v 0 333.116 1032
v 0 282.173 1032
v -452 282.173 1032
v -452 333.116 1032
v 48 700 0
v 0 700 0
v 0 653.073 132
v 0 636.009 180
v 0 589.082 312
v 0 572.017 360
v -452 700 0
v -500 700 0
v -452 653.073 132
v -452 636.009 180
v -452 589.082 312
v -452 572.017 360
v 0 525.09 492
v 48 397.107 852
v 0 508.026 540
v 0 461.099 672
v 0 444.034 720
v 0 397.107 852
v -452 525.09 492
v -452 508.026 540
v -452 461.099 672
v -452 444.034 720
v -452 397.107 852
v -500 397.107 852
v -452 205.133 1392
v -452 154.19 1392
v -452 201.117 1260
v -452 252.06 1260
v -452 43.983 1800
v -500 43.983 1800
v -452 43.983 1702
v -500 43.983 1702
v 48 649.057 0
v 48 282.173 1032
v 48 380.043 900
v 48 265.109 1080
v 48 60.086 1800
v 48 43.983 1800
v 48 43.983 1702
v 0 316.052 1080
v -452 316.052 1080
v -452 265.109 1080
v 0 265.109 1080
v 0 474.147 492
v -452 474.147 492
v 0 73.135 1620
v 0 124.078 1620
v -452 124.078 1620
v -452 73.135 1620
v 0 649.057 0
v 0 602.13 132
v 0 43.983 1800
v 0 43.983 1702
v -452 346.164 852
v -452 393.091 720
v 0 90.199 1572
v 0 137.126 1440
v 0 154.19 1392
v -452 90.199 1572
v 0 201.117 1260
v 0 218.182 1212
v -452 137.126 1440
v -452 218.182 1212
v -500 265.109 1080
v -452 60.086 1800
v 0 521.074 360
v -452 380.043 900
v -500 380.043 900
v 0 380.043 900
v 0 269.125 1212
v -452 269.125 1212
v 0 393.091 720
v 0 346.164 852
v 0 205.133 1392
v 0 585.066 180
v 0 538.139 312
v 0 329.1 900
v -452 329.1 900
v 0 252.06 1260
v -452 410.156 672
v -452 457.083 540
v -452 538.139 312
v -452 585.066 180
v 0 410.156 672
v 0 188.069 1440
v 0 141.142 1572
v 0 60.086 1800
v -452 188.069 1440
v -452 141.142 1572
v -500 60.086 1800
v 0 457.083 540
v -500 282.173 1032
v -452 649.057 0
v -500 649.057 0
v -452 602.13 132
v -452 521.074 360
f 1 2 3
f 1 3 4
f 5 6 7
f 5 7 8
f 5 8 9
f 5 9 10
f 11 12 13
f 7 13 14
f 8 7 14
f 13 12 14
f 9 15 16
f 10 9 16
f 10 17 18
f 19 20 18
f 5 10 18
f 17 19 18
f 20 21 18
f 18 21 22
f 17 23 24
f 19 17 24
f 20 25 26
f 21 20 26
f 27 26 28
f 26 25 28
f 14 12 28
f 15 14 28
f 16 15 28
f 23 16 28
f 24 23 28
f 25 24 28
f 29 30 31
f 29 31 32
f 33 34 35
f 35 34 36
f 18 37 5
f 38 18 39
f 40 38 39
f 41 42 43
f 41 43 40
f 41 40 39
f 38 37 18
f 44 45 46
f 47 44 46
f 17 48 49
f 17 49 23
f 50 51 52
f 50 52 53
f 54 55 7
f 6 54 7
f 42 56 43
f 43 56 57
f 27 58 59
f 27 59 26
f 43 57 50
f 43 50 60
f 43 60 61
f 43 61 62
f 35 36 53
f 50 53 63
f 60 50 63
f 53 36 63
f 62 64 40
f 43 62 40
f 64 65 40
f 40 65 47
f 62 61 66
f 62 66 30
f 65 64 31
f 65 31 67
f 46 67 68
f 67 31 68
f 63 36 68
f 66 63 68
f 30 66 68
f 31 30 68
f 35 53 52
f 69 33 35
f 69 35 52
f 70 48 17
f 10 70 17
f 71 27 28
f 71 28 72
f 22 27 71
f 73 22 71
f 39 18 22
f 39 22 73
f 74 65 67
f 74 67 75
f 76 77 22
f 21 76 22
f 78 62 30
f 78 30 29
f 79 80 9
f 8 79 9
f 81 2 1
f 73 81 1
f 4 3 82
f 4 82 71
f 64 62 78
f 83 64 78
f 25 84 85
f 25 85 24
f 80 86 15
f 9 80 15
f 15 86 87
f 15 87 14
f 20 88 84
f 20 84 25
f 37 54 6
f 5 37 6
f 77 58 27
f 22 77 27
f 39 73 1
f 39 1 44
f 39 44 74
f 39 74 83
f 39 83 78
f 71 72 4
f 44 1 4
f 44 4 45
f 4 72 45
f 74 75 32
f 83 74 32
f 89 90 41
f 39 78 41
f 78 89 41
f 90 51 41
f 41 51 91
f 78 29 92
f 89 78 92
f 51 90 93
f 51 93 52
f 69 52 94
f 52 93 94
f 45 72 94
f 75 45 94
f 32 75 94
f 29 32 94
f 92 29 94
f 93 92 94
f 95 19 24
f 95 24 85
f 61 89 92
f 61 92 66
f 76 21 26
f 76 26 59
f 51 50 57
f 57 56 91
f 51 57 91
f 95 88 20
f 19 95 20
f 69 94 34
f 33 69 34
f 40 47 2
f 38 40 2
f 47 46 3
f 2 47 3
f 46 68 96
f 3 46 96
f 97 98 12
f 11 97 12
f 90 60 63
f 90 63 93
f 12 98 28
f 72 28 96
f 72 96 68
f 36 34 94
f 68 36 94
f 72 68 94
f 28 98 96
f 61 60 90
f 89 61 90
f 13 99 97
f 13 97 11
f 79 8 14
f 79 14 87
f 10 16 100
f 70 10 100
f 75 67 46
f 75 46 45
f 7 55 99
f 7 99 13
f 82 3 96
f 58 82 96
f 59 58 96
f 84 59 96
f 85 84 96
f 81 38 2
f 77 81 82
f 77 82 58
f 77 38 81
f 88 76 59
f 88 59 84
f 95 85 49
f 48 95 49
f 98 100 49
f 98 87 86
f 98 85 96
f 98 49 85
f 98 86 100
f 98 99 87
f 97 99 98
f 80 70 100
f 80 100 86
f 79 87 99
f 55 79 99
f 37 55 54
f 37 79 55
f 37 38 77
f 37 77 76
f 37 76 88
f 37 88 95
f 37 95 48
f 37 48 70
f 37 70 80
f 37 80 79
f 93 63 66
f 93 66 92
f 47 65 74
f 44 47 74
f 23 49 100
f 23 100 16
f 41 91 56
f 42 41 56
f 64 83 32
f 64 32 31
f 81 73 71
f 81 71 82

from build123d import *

# Parameters (mm, degrees)
F1_DEPTH = 48
F3_DEPTH = 452


with BuildPart() as f1:
    # F0 (on Right) → F1 (new body)
    with BuildSketch(Plane.YZ):
        Polygon((538.1385763868, 312), (585.0655876551, 180), (636.0086209978, 180), (589.0816097296, 312), align=None)
        Polygon((457.0828296508, 540), (474.1471973847, 492), (525.0902307274, 492), (508.0258629935, 540), align=None)
        Polygon((265.1086926442, 1080), (282.1730603782, 1032), (333.1160937209, 1032), (316.051725987, 1080), align=None)
        Polygon((90.1989233716, 1572), (137.1259346399, 1440), (188.0689679826, 1440), (141.1419567144, 1572), align=None)
        Polygon((346.1644393803, 852), (393.0914506486, 720), (444.0344839913, 720), (397.1074727231, 852), align=None)
        Polygon((73.1345556377, 1620), (90.1989233716, 1572), (141.1419567144, 1572), (124.0775889805, 1620), align=None)
        Polygon((474.1471973847, 492), (521.0742086529, 360), (572.0172419957, 360), (525.0902307274, 492), align=None)
        Polygon((410.1558183825, 672), (457.0828296508, 540), (508.0258629935, 540), (461.0988517252, 672), align=None)
        Polygon((282.1730603782, 1032), (329.1000716464, 900), (380.0431049891, 900), (333.1160937209, 1032), align=None)
        Polygon((43.9829274256, 1702), (73.1345556377, 1620), (124.0775889805, 1620), (60.0862099783, 1800), (43.9829274256, 1800), align=None)
        Polygon((585.0655876551, 180), (602.129955389, 132), (653.0729887317, 132), (636.0086209978, 180), align=None)
        Polygon((393.0914506486, 720), (410.1558183825, 672), (461.0988517252, 672), (444.0344839913, 720), align=None)
        Polygon((602.129955389, 132), (649.0569666573, 0), (700, 0), (653.0729887317, 132), align=None)
        Polygon((201.1173136421, 1260), (218.181681376, 1212), (269.1247147187, 1212), (252.0603469848, 1260), align=None)
        Polygon((218.181681376, 1212), (265.1086926442, 1080), (316.051725987, 1080), (269.1247147187, 1212), align=None)
        Polygon((154.1903023738, 1392), (201.1173136421, 1260), (252.0603469848, 1260), (205.1333357165, 1392), align=None)
        Polygon((329.1000716464, 900), (346.1644393803, 852), (397.1074727231, 852), (380.0431049891, 900), align=None)
        Polygon((521.0742086529, 360), (538.1385763868, 312), (589.0816097296, 312), (572.0172419957, 360), align=None)
        Polygon((137.1259346399, 1440), (154.1903023738, 1392), (205.1333357165, 1392), (188.0689679826, 1440), align=None)
    extrude(amount=F1_DEPTH)


with BuildPart() as f2_1:
    # F2: copy of F1
    add(f1.part.moved(Location((-500, 0, 0))))


with BuildPart() as f1_1:
    add(f1.part)

    add(f2_1.part)  # F3 merges F2_1
    # F0 (on Right) → F3 (join)
    with BuildSketch(Plane.YZ):
        Polygon((585.0655876551, 180), (602.129955389, 132), (653.0729887317, 132), (636.0086209978, 180), align=None)
        Polygon((521.0742086529, 360), (538.1385763868, 312), (589.0816097296, 312), (572.0172419957, 360), align=None)
        Polygon((457.0828296508, 540), (474.1471973847, 492), (525.0902307274, 492), (508.0258629935, 540), align=None)
        Polygon((393.0914506486, 720), (410.1558183825, 672), (461.0988517252, 672), (444.0344839913, 720), align=None)
        Polygon((329.1000716464, 900), (346.1644393803, 852), (397.1074727231, 852), (380.0431049891, 900), align=None)
        Polygon((265.1086926442, 1080), (282.1730603782, 1032), (333.1160937209, 1032), (316.051725987, 1080), align=None)
        Polygon((201.1173136421, 1260), (218.181681376, 1212), (269.1247147187, 1212), (252.0603469848, 1260), align=None)
        Polygon((137.1259346399, 1440), (154.1903023738, 1392), (205.1333357165, 1392), (188.0689679826, 1440), align=None)
        Polygon((73.1345556377, 1620), (90.1989233716, 1572), (141.1419567144, 1572), (124.0775889805, 1620), align=None)
    extrude(amount=-F3_DEPTH)


solid = f1_1.part
